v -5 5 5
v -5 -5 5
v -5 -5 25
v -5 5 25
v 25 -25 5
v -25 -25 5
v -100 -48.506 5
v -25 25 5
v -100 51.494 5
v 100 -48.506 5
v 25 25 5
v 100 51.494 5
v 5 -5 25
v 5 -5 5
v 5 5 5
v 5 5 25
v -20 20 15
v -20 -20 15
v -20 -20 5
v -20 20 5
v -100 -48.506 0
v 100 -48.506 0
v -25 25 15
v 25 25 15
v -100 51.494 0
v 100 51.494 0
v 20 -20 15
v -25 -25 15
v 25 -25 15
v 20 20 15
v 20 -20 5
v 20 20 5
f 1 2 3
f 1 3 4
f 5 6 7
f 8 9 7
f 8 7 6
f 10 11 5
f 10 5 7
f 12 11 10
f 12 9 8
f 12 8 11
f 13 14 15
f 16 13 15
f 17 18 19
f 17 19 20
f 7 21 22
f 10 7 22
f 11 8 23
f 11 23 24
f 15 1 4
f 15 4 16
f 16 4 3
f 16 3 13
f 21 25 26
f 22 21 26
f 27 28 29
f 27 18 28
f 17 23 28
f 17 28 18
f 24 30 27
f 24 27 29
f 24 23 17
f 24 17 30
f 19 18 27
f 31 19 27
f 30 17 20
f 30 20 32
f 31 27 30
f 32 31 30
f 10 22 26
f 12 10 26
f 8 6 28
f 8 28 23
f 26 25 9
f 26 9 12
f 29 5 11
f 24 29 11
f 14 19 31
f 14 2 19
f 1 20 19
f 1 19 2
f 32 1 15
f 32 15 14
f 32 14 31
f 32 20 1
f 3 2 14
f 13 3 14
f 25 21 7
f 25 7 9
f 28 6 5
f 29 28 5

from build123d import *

# Parameters (mm, degrees)
F0_W     = 200
F0_H     = 100
F1_DEPTH = 5
F2_W     = 50
F2_H     = 50
F3_DEPTH = 10
F4_W     = 40
F4_H     = 40
F5_DEPTH = 10
F6_W     = 10
F6_H     = 10
F7_DEPTH = 20


with BuildPart() as f1:
    # F0 (on Top) → F1 (new body)
    with BuildSketch(Plane.XY):
        with Locations((0, 1.493815)):
            Rectangle(F0_W, F0_H)
    extrude(amount=F1_DEPTH)

    # F2 (on face) → F3 (join)
    with BuildSketch(Plane.XY.offset(5)):
        Rectangle(F2_W, F2_H)
    extrude(amount=F3_DEPTH)

    # F4 (on face) → F5 (cut)
    with BuildSketch(Plane.XY.offset(15)):
        Rectangle(F4_W, F4_H)
    extrude(amount=-F5_DEPTH, mode=Mode.SUBTRACT)

    # F6 (on face) → F7 (join)
    with BuildSketch(Plane.XY.offset(5)):
        Rectangle(F6_W, F6_H)
    extrude(amount=F7_DEPTH)


solid = f1.part
